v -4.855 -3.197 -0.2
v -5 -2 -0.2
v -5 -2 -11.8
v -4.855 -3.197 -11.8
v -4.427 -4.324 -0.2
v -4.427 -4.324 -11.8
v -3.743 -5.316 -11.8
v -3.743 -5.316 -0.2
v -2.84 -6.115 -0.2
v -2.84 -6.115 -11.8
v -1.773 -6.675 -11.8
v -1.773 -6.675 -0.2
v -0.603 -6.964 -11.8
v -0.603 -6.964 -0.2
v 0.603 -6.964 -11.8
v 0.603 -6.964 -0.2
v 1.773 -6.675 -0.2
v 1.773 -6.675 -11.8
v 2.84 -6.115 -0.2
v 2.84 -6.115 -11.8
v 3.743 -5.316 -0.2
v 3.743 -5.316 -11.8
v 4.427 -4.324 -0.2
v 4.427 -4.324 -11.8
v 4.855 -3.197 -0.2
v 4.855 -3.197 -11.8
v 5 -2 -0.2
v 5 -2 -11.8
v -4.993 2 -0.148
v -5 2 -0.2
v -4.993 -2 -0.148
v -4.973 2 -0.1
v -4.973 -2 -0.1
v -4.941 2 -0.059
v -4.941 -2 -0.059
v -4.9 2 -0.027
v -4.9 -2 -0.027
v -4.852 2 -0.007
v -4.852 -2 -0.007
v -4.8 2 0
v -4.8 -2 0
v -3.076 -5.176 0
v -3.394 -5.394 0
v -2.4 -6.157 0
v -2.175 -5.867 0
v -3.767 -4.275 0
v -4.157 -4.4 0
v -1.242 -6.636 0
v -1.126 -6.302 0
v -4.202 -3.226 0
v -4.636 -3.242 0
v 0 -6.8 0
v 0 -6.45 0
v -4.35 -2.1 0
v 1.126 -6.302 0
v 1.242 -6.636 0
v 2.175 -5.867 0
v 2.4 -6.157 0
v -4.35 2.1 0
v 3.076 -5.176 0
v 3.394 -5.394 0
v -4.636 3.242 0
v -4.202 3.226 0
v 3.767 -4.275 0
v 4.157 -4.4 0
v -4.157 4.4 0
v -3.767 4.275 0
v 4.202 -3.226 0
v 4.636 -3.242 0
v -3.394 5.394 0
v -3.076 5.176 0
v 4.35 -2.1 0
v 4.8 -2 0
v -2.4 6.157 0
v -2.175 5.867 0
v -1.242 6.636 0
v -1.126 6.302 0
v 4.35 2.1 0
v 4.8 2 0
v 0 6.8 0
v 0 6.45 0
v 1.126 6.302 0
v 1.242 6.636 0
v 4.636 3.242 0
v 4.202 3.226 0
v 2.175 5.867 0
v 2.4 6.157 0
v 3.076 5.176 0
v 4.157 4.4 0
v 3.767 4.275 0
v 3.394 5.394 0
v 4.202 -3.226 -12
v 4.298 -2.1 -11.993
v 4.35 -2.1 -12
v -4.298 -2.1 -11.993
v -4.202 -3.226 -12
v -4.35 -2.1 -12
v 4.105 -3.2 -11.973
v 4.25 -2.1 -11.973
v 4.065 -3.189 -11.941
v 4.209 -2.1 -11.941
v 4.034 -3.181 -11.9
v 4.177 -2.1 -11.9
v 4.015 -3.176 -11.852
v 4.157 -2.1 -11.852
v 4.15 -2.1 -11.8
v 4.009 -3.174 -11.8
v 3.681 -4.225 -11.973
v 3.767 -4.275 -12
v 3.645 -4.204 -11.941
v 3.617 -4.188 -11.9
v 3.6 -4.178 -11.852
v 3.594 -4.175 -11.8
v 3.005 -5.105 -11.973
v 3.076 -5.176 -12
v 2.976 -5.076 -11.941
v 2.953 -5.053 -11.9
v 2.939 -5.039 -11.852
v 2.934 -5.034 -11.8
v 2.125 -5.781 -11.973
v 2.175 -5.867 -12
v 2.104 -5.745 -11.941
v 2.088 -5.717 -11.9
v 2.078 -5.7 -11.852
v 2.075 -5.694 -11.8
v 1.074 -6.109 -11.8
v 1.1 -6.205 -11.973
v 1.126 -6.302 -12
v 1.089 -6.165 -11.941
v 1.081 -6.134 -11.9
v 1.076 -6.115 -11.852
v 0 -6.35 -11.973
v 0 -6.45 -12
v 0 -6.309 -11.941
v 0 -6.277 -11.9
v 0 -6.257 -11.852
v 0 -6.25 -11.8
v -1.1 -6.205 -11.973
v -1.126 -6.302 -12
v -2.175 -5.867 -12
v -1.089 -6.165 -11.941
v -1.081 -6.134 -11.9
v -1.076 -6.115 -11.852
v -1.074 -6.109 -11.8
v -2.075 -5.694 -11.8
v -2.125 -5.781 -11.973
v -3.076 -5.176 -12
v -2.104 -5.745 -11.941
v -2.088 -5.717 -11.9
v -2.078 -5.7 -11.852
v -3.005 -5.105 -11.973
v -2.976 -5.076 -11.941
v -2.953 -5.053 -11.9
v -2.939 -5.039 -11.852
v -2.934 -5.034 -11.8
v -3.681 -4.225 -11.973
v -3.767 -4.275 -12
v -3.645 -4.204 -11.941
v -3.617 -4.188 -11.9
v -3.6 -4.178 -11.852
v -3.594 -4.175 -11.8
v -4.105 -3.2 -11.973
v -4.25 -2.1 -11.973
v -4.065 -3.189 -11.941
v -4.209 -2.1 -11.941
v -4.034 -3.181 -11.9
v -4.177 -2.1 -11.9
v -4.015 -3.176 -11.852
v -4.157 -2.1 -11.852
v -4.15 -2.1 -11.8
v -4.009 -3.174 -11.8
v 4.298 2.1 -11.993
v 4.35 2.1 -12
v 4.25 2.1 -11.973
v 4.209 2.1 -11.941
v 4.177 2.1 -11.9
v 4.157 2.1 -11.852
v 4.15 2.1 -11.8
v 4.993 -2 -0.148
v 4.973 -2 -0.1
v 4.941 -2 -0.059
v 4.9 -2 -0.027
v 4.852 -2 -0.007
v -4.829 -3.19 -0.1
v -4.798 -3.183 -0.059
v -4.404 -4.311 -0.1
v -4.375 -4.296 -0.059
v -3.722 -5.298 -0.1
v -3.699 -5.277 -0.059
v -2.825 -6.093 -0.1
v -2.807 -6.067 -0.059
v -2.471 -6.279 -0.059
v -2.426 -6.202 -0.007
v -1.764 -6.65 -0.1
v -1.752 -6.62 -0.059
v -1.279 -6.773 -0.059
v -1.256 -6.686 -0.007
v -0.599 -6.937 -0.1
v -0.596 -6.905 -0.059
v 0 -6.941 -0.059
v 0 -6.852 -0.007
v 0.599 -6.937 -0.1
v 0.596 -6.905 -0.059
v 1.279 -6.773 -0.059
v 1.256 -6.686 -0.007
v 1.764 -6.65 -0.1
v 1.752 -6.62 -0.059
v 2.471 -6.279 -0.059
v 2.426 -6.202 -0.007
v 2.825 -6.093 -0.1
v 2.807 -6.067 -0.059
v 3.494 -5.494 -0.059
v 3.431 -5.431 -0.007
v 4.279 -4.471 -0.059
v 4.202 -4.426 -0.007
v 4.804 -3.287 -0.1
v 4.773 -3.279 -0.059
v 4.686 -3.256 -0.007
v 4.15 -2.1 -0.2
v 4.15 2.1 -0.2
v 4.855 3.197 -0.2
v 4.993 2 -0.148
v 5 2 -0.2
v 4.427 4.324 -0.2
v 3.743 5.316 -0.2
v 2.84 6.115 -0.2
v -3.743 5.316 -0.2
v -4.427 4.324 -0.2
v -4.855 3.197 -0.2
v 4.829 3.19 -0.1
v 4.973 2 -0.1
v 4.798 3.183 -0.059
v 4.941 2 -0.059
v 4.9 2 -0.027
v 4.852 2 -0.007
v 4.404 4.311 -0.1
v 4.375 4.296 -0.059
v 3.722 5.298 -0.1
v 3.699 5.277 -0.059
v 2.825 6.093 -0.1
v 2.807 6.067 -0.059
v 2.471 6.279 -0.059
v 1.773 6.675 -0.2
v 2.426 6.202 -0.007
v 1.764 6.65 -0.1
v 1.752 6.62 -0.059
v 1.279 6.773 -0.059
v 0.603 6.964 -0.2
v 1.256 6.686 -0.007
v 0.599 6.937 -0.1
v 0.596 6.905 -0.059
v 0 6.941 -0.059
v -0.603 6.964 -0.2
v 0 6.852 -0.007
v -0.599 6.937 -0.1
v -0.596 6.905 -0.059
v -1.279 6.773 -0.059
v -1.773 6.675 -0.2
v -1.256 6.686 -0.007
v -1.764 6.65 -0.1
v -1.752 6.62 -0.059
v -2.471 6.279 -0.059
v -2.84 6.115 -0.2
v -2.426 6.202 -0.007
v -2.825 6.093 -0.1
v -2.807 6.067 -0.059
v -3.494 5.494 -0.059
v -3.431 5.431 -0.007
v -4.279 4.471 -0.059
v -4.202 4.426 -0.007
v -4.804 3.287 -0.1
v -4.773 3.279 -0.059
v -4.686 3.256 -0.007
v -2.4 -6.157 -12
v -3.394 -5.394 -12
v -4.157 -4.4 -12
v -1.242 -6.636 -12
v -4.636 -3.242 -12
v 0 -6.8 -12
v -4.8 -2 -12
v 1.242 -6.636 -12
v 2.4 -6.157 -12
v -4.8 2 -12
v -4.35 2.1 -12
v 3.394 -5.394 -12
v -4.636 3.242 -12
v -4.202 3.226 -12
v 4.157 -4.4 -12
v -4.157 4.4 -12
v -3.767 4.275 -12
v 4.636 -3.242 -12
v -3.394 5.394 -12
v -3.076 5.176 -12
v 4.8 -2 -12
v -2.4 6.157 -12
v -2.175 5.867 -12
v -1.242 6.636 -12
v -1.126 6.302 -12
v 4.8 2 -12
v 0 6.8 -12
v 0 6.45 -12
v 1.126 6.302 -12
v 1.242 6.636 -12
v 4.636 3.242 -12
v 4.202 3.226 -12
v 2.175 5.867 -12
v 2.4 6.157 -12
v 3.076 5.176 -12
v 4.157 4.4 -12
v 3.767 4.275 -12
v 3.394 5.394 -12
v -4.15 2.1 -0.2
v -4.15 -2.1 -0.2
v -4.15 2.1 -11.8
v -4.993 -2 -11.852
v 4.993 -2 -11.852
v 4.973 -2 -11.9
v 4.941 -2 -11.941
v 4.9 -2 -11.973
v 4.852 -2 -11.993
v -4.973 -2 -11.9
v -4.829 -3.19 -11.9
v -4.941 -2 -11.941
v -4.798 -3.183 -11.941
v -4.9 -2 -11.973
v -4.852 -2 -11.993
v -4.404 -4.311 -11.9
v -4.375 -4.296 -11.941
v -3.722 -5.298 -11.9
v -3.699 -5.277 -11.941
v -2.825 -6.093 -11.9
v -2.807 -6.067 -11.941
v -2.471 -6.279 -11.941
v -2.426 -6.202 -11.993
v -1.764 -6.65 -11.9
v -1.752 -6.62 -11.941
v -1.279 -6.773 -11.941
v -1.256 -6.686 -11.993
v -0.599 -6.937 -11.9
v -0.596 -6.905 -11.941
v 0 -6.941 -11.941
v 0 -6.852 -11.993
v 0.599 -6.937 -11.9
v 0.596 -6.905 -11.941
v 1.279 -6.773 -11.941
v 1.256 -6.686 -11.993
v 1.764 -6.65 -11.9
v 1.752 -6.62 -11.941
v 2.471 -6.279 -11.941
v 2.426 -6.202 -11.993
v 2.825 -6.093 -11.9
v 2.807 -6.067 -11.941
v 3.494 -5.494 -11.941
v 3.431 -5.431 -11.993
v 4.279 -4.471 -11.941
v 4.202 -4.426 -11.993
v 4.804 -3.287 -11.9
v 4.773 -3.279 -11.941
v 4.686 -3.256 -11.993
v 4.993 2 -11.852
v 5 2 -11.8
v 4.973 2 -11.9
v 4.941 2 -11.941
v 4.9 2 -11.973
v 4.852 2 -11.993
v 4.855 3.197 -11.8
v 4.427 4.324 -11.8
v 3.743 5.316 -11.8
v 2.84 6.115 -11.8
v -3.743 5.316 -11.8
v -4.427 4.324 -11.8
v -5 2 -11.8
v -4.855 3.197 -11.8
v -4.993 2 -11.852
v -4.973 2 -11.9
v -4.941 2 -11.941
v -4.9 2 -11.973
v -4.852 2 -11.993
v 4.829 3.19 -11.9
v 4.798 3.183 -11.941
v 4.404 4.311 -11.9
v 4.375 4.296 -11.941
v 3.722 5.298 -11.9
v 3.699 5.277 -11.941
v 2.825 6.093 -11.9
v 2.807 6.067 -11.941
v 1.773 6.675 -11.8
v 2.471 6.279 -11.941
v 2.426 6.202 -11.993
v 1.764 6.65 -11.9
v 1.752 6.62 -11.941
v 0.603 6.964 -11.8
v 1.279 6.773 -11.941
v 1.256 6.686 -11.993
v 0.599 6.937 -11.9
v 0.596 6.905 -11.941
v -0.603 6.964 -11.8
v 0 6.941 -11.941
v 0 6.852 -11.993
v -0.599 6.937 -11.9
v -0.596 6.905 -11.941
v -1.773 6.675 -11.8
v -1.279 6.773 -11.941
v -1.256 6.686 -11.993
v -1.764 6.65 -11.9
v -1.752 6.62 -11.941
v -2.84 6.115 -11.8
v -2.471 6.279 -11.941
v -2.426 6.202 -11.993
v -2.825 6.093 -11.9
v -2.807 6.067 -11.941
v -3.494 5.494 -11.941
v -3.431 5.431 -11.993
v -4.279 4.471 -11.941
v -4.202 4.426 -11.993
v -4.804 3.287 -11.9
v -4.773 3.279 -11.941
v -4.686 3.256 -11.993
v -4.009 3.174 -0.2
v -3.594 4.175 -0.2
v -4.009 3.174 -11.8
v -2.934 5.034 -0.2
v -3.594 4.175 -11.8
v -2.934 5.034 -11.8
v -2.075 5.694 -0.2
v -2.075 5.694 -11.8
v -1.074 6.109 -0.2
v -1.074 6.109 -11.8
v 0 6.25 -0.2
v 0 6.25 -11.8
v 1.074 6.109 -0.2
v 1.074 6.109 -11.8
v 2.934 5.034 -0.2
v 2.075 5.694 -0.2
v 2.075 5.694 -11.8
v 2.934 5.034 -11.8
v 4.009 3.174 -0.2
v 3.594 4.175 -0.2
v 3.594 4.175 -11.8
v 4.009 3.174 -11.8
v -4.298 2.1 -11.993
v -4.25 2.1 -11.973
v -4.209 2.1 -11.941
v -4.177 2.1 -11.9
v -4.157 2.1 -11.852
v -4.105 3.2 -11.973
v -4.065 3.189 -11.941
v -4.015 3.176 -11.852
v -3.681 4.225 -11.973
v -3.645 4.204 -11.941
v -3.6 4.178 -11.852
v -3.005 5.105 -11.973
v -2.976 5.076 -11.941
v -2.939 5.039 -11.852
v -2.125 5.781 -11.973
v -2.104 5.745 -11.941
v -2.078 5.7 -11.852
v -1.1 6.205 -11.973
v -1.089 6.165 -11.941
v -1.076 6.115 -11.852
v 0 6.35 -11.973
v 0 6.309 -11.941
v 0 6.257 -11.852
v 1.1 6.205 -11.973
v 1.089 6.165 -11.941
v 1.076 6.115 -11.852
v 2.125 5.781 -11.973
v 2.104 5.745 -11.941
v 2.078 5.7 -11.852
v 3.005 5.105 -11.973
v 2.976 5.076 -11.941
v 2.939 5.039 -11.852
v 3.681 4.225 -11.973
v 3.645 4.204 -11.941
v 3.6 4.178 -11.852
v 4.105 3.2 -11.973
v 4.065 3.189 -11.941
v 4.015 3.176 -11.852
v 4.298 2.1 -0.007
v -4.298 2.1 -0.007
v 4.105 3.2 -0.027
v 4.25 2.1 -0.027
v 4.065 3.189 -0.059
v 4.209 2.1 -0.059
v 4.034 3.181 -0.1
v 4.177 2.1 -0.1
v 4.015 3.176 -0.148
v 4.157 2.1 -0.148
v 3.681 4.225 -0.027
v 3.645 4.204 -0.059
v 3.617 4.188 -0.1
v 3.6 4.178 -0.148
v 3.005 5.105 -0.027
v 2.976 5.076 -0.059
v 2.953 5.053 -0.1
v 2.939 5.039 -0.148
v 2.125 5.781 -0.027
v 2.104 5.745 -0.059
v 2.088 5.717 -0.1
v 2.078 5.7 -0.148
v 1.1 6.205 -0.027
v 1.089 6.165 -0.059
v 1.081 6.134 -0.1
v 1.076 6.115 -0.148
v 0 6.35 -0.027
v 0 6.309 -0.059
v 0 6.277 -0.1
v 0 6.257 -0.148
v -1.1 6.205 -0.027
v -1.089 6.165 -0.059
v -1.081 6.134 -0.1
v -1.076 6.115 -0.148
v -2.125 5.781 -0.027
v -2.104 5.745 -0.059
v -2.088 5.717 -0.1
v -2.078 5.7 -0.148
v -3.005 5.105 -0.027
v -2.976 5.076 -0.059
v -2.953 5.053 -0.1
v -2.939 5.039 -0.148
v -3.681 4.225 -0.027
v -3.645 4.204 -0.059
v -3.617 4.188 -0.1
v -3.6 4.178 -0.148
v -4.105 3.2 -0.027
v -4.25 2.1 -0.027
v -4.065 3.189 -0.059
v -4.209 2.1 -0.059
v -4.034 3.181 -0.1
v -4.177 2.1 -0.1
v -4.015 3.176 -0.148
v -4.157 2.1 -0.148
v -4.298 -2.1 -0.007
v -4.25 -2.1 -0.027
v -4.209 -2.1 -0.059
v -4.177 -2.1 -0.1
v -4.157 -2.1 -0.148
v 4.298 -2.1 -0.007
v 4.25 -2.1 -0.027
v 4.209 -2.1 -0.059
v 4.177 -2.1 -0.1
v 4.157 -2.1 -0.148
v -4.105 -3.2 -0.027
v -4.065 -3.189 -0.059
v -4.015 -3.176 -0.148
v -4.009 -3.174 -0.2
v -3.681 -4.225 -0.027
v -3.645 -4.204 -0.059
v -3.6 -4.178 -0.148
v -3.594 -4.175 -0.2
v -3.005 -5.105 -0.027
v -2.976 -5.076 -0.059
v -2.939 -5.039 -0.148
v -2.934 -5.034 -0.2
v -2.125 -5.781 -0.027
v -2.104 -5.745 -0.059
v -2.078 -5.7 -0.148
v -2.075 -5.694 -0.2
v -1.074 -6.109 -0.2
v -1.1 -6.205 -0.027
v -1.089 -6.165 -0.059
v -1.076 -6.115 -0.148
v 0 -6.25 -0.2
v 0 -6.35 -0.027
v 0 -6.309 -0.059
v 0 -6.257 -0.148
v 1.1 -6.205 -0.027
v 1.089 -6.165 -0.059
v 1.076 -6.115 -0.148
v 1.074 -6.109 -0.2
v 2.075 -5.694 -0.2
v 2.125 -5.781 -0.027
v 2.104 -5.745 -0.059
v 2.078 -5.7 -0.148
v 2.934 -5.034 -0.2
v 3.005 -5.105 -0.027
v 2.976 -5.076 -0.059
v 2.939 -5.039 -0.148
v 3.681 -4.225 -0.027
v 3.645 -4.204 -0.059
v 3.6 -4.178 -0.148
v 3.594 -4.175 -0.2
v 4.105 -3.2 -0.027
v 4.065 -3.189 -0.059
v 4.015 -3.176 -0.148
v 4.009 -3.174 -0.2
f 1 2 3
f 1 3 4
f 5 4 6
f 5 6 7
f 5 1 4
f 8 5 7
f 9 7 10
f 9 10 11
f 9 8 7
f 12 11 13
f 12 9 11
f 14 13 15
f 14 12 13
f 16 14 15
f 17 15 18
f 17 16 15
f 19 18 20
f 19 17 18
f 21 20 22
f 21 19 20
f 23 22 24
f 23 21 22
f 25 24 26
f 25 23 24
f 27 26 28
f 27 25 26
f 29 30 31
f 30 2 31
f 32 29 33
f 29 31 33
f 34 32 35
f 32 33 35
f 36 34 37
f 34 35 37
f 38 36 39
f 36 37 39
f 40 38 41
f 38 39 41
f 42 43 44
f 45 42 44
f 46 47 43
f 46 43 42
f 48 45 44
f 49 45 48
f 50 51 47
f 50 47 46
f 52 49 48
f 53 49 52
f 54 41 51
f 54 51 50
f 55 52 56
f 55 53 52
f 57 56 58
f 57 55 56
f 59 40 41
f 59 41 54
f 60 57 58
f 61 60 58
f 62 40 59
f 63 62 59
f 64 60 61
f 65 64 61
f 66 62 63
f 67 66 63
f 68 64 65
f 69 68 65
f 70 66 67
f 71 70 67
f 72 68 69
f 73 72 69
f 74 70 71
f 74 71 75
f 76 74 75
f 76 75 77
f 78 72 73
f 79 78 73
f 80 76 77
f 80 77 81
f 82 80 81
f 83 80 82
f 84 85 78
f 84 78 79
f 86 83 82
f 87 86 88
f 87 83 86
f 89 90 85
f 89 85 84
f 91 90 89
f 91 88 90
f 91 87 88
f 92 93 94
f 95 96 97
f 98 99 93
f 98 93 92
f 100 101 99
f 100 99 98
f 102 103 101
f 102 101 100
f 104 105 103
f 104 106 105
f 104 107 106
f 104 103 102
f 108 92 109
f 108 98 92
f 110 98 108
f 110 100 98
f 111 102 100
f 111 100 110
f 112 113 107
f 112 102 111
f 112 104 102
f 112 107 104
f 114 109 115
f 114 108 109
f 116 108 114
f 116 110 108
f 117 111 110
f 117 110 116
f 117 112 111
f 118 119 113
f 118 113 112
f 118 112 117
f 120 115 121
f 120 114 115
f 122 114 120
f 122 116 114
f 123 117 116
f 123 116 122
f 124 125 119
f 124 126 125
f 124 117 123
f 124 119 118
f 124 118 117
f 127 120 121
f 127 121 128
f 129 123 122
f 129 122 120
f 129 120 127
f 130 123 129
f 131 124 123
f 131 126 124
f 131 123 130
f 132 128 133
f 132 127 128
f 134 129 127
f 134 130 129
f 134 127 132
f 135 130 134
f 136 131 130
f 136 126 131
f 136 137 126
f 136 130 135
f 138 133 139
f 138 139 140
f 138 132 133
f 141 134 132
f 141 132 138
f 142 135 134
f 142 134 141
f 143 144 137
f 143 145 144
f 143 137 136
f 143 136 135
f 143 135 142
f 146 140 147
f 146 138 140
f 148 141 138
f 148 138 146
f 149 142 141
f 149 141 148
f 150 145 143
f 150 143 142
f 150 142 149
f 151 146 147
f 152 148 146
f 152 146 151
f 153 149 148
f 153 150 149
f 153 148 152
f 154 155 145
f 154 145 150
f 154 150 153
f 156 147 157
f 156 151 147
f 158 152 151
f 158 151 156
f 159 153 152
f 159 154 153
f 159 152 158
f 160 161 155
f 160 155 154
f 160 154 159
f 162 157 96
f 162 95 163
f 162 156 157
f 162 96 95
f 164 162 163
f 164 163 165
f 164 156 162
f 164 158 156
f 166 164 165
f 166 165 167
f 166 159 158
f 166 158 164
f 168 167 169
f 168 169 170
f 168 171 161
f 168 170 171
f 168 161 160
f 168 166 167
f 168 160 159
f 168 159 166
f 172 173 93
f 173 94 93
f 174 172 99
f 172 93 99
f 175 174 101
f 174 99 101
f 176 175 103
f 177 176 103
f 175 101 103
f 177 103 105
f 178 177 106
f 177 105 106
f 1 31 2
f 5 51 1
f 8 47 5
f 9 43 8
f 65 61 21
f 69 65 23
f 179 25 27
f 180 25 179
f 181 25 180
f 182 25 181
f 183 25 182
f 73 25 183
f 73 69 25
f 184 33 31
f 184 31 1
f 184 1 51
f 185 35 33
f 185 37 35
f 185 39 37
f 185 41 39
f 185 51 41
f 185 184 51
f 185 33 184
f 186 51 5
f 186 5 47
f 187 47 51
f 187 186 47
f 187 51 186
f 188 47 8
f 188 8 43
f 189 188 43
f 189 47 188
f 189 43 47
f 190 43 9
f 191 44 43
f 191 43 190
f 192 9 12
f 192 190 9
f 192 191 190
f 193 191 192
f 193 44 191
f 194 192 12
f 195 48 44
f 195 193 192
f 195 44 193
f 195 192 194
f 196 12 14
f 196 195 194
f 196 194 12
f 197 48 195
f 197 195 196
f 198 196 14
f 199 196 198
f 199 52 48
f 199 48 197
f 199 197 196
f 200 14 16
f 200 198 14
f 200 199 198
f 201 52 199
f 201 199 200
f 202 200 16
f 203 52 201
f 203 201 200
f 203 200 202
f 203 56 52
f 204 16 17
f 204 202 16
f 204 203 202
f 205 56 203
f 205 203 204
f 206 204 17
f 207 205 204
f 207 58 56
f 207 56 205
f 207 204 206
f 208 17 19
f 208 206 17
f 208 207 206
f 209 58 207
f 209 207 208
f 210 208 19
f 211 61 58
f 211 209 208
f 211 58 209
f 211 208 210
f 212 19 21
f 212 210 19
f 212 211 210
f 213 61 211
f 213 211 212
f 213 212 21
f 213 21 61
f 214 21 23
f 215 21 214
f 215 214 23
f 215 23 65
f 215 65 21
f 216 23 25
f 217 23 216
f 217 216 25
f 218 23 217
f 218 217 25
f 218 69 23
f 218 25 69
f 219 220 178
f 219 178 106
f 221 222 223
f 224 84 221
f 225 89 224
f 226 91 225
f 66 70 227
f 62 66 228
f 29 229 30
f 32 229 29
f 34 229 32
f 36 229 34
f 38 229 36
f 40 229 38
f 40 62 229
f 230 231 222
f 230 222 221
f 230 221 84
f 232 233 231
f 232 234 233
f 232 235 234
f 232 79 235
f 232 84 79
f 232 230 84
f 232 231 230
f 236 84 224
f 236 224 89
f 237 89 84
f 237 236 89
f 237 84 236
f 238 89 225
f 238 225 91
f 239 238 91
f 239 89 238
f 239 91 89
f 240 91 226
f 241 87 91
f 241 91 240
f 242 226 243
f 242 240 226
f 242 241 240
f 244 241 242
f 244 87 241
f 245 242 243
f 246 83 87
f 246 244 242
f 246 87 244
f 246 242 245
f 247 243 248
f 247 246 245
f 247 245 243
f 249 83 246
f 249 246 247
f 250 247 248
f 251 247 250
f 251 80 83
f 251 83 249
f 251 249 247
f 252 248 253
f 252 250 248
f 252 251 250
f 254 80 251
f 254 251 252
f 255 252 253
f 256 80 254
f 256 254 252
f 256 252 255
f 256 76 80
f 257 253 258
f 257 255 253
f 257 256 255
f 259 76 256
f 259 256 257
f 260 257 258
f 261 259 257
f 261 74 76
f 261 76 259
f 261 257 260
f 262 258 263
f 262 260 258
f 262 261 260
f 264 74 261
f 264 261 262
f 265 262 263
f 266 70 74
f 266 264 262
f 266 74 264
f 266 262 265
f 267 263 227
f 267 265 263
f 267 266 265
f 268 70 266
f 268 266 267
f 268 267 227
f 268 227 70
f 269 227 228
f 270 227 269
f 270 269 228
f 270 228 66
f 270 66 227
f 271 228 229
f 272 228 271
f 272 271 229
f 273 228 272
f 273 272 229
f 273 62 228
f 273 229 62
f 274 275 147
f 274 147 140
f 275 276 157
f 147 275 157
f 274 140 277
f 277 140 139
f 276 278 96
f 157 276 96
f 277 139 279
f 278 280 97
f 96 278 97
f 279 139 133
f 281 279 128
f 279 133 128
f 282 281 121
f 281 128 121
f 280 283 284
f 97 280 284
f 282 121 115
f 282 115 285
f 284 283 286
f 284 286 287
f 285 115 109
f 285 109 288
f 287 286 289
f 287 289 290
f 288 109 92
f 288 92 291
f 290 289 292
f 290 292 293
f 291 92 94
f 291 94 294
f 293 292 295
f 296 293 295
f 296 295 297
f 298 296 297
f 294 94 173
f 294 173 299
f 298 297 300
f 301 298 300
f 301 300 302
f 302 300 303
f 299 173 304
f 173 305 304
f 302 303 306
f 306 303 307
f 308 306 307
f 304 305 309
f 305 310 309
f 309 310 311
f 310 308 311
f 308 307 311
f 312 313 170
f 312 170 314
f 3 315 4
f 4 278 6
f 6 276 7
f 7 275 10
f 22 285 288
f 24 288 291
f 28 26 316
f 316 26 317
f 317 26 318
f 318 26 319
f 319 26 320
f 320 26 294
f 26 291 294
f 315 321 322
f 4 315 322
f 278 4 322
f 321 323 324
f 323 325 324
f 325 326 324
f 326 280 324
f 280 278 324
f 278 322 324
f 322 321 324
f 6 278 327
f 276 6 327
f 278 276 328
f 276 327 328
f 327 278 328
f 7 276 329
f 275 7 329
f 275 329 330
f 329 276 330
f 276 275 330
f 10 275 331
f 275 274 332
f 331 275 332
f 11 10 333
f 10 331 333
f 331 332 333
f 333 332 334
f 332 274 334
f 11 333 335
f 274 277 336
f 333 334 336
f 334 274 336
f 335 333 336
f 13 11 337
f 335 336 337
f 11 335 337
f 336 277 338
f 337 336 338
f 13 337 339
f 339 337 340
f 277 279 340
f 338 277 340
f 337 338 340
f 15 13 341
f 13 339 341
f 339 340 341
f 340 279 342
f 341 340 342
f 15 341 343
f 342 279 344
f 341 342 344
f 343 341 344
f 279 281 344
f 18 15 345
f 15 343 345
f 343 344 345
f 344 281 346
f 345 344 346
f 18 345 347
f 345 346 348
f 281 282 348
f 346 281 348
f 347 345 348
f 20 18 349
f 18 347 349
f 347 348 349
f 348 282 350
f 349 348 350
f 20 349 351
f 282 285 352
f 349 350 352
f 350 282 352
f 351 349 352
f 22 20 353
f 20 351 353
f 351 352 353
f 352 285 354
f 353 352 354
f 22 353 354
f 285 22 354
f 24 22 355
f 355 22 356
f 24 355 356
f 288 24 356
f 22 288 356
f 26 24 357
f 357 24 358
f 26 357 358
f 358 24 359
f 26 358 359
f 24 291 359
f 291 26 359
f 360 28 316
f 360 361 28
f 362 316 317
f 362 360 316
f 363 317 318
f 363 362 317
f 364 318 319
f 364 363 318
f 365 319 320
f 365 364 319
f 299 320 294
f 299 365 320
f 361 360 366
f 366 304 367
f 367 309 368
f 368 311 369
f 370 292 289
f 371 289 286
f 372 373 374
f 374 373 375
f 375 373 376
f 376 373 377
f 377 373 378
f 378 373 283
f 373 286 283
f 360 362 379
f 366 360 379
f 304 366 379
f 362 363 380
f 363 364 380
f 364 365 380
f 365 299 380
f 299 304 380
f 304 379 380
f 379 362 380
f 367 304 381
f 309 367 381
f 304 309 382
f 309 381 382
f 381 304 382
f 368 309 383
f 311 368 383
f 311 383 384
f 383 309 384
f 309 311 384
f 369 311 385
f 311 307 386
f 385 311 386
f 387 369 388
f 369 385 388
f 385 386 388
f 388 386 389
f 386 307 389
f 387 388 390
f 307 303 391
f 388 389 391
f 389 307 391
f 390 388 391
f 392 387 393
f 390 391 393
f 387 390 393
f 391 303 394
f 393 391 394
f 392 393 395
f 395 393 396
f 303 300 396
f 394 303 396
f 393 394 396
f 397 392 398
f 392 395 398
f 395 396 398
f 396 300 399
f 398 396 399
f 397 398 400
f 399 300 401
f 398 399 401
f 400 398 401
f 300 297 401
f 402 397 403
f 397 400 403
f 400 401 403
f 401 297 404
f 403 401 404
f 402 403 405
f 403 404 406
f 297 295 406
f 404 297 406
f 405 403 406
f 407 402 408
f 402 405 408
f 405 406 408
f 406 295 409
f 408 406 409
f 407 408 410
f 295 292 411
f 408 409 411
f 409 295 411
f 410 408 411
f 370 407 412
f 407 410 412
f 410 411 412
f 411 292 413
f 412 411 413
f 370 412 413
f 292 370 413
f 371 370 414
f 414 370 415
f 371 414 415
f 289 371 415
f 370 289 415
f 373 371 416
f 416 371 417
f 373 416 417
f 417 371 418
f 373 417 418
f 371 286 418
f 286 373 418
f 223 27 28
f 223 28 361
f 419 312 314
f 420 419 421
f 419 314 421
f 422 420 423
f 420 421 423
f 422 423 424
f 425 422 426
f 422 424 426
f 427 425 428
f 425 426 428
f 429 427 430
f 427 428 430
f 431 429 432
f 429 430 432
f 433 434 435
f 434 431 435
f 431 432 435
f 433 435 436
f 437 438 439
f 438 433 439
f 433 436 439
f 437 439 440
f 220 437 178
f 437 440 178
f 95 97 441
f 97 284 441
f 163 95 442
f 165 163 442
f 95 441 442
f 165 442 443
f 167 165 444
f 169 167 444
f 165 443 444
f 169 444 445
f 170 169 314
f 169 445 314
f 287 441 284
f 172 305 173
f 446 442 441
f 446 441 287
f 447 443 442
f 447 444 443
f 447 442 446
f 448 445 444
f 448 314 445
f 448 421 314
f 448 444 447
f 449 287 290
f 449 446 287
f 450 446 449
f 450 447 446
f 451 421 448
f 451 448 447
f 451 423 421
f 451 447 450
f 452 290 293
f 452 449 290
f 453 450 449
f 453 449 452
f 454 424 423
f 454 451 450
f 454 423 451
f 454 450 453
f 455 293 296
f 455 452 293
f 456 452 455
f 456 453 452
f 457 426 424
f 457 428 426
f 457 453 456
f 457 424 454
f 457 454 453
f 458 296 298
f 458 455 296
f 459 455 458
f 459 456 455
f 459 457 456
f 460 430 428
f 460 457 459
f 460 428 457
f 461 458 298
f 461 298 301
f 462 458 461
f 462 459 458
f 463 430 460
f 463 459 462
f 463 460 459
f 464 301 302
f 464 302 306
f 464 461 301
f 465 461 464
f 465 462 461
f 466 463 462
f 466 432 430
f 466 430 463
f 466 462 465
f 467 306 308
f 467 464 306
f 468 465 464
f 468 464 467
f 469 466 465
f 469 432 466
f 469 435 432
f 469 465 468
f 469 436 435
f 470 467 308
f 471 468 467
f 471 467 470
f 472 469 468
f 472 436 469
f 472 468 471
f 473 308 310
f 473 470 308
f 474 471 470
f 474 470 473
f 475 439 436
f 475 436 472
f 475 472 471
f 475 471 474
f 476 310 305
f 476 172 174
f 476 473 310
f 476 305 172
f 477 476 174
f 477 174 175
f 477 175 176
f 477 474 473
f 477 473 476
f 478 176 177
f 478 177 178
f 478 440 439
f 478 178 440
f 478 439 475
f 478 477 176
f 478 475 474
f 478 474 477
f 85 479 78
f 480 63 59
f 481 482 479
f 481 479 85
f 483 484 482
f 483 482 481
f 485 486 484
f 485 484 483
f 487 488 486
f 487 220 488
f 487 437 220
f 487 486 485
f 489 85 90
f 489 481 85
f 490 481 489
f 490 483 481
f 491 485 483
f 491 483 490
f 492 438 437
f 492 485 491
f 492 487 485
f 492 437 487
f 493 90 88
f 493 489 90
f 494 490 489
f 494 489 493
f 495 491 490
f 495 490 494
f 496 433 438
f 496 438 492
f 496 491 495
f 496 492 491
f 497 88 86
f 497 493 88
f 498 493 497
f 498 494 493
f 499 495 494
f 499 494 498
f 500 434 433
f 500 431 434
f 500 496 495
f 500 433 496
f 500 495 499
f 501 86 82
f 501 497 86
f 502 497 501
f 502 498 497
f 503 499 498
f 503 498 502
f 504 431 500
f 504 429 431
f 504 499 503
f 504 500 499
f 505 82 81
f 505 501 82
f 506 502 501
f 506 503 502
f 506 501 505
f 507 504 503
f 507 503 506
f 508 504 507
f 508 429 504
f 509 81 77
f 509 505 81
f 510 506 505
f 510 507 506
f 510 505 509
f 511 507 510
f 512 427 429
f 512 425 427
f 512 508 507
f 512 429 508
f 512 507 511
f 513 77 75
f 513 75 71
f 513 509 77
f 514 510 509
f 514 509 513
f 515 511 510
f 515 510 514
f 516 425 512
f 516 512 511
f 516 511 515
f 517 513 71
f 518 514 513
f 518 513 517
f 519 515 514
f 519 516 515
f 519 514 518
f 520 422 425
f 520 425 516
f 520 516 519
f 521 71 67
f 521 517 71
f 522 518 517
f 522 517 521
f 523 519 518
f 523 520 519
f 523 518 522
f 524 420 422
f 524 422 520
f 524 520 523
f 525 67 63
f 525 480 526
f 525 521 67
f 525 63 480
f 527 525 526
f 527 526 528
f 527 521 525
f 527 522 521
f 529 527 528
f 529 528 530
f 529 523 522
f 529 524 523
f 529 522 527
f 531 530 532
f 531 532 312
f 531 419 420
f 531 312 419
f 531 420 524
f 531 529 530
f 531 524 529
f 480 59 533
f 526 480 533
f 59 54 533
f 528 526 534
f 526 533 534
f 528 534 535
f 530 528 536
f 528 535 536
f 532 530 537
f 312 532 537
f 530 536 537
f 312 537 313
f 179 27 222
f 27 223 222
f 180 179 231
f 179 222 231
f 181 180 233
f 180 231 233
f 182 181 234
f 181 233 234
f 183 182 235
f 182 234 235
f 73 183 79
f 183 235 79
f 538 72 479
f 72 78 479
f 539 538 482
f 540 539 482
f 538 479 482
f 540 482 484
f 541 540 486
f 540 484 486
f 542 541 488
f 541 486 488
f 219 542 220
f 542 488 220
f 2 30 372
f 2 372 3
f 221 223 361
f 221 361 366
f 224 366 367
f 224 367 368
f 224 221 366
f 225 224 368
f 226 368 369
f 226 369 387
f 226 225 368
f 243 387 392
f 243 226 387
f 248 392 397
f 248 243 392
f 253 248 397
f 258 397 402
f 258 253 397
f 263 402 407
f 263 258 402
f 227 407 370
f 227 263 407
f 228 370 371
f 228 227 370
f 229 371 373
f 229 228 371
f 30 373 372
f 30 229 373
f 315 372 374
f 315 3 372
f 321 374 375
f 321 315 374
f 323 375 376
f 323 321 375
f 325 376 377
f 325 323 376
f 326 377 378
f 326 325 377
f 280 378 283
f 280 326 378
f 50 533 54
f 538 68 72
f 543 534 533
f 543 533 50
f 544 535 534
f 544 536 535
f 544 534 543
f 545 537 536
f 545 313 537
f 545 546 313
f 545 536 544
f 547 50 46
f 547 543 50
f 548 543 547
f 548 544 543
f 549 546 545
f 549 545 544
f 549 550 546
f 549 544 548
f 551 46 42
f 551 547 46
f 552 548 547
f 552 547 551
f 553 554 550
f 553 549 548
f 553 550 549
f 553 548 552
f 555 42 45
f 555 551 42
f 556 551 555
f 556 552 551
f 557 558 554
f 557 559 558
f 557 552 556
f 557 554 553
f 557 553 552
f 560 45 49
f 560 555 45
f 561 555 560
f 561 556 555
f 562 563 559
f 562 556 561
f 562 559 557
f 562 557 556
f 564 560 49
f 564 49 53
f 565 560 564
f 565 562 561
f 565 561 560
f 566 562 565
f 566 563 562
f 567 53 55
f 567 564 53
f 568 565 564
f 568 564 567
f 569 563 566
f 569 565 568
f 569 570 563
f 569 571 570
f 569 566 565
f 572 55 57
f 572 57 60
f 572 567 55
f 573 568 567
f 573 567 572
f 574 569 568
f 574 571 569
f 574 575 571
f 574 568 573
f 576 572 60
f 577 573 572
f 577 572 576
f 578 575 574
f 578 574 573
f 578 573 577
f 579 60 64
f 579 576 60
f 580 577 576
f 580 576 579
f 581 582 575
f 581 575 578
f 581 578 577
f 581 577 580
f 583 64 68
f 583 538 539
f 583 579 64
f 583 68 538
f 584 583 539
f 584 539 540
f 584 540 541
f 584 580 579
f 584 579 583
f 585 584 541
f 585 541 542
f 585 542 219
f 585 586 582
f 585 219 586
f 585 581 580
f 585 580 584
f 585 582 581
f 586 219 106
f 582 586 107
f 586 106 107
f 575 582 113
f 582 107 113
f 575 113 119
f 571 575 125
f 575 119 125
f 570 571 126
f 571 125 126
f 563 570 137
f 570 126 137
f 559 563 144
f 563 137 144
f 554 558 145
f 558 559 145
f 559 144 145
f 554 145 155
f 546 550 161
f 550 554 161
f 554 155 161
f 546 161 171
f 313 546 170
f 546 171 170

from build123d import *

# Parameters (mm, degrees)
PAD_DEPTH    = 12
POCKET_DEPTH = 12.001
FILLET_R     = 0.2
FILLET001_R  = 0.2


with BuildPart() as part:
    # Sketch → Pad (new body)
    with BuildSketch(Plane.XY):
        with BuildLine():
            ThreePointArc((5, 2), (0, 7), (-5, 2))
            Line((-5, 2), (-5, -2))
            ThreePointArc((-5, -2), (0, -7), (5, -2))
            Line((5, -2), (5, 2))
        make_face()
    extrude(amount=-PAD_DEPTH)

    # Sketch001 (on Face6 of Pad) → Pocket (cut, through all)
    with BuildSketch(Plane(origin=(0, 0, -12), x_dir=(1, 0, 0), z_dir=(0, 0, -1))):
        with BuildLine():
            ThreePointArc((4.15, 2.1), (0, 6.25), (-4.15, 2.1))
            Line((-4.15, 2.1), (-4.15, -2.1))
            ThreePointArc((-4.15, -2.1), (0, -6.25), (4.15, -2.1))
            Line((4.15, -2.1), (4.15, 2.1))
        make_face()
    extrude(amount=-POCKET_DEPTH, mode=Mode.SUBTRACT)

    # Fillet
    fillet_edges = [part.edges().sort_by_distance(p)[0] for p in [
        (0, 7, 0),
        (5, 0, 0),
        (-5, 0, 0),
        (0, -7, 0),
        (4.15, 0, 0),
        (0, 6.25, 0),
        (-4.15, 0, 0),
        (0, -6.25, 0),
    ]]
    fillet(fillet_edges, radius=FILLET_R)

    # Fillet001
    fillet001_edges = [part.edges().sort_by_distance(p)[0] for p in [
        (0, 7, -12),
        (5, 0, -12),
        (-5, 0, -12),
        (0, -7, -12),
        (4.15, 0, -12),
        (0, 6.25, -12),
        (-4.15, 0, -12),
        (0, -6.25, -12),
    ]]
    fillet(fillet001_edges, radius=FILLET001_R)


solid = part.part
